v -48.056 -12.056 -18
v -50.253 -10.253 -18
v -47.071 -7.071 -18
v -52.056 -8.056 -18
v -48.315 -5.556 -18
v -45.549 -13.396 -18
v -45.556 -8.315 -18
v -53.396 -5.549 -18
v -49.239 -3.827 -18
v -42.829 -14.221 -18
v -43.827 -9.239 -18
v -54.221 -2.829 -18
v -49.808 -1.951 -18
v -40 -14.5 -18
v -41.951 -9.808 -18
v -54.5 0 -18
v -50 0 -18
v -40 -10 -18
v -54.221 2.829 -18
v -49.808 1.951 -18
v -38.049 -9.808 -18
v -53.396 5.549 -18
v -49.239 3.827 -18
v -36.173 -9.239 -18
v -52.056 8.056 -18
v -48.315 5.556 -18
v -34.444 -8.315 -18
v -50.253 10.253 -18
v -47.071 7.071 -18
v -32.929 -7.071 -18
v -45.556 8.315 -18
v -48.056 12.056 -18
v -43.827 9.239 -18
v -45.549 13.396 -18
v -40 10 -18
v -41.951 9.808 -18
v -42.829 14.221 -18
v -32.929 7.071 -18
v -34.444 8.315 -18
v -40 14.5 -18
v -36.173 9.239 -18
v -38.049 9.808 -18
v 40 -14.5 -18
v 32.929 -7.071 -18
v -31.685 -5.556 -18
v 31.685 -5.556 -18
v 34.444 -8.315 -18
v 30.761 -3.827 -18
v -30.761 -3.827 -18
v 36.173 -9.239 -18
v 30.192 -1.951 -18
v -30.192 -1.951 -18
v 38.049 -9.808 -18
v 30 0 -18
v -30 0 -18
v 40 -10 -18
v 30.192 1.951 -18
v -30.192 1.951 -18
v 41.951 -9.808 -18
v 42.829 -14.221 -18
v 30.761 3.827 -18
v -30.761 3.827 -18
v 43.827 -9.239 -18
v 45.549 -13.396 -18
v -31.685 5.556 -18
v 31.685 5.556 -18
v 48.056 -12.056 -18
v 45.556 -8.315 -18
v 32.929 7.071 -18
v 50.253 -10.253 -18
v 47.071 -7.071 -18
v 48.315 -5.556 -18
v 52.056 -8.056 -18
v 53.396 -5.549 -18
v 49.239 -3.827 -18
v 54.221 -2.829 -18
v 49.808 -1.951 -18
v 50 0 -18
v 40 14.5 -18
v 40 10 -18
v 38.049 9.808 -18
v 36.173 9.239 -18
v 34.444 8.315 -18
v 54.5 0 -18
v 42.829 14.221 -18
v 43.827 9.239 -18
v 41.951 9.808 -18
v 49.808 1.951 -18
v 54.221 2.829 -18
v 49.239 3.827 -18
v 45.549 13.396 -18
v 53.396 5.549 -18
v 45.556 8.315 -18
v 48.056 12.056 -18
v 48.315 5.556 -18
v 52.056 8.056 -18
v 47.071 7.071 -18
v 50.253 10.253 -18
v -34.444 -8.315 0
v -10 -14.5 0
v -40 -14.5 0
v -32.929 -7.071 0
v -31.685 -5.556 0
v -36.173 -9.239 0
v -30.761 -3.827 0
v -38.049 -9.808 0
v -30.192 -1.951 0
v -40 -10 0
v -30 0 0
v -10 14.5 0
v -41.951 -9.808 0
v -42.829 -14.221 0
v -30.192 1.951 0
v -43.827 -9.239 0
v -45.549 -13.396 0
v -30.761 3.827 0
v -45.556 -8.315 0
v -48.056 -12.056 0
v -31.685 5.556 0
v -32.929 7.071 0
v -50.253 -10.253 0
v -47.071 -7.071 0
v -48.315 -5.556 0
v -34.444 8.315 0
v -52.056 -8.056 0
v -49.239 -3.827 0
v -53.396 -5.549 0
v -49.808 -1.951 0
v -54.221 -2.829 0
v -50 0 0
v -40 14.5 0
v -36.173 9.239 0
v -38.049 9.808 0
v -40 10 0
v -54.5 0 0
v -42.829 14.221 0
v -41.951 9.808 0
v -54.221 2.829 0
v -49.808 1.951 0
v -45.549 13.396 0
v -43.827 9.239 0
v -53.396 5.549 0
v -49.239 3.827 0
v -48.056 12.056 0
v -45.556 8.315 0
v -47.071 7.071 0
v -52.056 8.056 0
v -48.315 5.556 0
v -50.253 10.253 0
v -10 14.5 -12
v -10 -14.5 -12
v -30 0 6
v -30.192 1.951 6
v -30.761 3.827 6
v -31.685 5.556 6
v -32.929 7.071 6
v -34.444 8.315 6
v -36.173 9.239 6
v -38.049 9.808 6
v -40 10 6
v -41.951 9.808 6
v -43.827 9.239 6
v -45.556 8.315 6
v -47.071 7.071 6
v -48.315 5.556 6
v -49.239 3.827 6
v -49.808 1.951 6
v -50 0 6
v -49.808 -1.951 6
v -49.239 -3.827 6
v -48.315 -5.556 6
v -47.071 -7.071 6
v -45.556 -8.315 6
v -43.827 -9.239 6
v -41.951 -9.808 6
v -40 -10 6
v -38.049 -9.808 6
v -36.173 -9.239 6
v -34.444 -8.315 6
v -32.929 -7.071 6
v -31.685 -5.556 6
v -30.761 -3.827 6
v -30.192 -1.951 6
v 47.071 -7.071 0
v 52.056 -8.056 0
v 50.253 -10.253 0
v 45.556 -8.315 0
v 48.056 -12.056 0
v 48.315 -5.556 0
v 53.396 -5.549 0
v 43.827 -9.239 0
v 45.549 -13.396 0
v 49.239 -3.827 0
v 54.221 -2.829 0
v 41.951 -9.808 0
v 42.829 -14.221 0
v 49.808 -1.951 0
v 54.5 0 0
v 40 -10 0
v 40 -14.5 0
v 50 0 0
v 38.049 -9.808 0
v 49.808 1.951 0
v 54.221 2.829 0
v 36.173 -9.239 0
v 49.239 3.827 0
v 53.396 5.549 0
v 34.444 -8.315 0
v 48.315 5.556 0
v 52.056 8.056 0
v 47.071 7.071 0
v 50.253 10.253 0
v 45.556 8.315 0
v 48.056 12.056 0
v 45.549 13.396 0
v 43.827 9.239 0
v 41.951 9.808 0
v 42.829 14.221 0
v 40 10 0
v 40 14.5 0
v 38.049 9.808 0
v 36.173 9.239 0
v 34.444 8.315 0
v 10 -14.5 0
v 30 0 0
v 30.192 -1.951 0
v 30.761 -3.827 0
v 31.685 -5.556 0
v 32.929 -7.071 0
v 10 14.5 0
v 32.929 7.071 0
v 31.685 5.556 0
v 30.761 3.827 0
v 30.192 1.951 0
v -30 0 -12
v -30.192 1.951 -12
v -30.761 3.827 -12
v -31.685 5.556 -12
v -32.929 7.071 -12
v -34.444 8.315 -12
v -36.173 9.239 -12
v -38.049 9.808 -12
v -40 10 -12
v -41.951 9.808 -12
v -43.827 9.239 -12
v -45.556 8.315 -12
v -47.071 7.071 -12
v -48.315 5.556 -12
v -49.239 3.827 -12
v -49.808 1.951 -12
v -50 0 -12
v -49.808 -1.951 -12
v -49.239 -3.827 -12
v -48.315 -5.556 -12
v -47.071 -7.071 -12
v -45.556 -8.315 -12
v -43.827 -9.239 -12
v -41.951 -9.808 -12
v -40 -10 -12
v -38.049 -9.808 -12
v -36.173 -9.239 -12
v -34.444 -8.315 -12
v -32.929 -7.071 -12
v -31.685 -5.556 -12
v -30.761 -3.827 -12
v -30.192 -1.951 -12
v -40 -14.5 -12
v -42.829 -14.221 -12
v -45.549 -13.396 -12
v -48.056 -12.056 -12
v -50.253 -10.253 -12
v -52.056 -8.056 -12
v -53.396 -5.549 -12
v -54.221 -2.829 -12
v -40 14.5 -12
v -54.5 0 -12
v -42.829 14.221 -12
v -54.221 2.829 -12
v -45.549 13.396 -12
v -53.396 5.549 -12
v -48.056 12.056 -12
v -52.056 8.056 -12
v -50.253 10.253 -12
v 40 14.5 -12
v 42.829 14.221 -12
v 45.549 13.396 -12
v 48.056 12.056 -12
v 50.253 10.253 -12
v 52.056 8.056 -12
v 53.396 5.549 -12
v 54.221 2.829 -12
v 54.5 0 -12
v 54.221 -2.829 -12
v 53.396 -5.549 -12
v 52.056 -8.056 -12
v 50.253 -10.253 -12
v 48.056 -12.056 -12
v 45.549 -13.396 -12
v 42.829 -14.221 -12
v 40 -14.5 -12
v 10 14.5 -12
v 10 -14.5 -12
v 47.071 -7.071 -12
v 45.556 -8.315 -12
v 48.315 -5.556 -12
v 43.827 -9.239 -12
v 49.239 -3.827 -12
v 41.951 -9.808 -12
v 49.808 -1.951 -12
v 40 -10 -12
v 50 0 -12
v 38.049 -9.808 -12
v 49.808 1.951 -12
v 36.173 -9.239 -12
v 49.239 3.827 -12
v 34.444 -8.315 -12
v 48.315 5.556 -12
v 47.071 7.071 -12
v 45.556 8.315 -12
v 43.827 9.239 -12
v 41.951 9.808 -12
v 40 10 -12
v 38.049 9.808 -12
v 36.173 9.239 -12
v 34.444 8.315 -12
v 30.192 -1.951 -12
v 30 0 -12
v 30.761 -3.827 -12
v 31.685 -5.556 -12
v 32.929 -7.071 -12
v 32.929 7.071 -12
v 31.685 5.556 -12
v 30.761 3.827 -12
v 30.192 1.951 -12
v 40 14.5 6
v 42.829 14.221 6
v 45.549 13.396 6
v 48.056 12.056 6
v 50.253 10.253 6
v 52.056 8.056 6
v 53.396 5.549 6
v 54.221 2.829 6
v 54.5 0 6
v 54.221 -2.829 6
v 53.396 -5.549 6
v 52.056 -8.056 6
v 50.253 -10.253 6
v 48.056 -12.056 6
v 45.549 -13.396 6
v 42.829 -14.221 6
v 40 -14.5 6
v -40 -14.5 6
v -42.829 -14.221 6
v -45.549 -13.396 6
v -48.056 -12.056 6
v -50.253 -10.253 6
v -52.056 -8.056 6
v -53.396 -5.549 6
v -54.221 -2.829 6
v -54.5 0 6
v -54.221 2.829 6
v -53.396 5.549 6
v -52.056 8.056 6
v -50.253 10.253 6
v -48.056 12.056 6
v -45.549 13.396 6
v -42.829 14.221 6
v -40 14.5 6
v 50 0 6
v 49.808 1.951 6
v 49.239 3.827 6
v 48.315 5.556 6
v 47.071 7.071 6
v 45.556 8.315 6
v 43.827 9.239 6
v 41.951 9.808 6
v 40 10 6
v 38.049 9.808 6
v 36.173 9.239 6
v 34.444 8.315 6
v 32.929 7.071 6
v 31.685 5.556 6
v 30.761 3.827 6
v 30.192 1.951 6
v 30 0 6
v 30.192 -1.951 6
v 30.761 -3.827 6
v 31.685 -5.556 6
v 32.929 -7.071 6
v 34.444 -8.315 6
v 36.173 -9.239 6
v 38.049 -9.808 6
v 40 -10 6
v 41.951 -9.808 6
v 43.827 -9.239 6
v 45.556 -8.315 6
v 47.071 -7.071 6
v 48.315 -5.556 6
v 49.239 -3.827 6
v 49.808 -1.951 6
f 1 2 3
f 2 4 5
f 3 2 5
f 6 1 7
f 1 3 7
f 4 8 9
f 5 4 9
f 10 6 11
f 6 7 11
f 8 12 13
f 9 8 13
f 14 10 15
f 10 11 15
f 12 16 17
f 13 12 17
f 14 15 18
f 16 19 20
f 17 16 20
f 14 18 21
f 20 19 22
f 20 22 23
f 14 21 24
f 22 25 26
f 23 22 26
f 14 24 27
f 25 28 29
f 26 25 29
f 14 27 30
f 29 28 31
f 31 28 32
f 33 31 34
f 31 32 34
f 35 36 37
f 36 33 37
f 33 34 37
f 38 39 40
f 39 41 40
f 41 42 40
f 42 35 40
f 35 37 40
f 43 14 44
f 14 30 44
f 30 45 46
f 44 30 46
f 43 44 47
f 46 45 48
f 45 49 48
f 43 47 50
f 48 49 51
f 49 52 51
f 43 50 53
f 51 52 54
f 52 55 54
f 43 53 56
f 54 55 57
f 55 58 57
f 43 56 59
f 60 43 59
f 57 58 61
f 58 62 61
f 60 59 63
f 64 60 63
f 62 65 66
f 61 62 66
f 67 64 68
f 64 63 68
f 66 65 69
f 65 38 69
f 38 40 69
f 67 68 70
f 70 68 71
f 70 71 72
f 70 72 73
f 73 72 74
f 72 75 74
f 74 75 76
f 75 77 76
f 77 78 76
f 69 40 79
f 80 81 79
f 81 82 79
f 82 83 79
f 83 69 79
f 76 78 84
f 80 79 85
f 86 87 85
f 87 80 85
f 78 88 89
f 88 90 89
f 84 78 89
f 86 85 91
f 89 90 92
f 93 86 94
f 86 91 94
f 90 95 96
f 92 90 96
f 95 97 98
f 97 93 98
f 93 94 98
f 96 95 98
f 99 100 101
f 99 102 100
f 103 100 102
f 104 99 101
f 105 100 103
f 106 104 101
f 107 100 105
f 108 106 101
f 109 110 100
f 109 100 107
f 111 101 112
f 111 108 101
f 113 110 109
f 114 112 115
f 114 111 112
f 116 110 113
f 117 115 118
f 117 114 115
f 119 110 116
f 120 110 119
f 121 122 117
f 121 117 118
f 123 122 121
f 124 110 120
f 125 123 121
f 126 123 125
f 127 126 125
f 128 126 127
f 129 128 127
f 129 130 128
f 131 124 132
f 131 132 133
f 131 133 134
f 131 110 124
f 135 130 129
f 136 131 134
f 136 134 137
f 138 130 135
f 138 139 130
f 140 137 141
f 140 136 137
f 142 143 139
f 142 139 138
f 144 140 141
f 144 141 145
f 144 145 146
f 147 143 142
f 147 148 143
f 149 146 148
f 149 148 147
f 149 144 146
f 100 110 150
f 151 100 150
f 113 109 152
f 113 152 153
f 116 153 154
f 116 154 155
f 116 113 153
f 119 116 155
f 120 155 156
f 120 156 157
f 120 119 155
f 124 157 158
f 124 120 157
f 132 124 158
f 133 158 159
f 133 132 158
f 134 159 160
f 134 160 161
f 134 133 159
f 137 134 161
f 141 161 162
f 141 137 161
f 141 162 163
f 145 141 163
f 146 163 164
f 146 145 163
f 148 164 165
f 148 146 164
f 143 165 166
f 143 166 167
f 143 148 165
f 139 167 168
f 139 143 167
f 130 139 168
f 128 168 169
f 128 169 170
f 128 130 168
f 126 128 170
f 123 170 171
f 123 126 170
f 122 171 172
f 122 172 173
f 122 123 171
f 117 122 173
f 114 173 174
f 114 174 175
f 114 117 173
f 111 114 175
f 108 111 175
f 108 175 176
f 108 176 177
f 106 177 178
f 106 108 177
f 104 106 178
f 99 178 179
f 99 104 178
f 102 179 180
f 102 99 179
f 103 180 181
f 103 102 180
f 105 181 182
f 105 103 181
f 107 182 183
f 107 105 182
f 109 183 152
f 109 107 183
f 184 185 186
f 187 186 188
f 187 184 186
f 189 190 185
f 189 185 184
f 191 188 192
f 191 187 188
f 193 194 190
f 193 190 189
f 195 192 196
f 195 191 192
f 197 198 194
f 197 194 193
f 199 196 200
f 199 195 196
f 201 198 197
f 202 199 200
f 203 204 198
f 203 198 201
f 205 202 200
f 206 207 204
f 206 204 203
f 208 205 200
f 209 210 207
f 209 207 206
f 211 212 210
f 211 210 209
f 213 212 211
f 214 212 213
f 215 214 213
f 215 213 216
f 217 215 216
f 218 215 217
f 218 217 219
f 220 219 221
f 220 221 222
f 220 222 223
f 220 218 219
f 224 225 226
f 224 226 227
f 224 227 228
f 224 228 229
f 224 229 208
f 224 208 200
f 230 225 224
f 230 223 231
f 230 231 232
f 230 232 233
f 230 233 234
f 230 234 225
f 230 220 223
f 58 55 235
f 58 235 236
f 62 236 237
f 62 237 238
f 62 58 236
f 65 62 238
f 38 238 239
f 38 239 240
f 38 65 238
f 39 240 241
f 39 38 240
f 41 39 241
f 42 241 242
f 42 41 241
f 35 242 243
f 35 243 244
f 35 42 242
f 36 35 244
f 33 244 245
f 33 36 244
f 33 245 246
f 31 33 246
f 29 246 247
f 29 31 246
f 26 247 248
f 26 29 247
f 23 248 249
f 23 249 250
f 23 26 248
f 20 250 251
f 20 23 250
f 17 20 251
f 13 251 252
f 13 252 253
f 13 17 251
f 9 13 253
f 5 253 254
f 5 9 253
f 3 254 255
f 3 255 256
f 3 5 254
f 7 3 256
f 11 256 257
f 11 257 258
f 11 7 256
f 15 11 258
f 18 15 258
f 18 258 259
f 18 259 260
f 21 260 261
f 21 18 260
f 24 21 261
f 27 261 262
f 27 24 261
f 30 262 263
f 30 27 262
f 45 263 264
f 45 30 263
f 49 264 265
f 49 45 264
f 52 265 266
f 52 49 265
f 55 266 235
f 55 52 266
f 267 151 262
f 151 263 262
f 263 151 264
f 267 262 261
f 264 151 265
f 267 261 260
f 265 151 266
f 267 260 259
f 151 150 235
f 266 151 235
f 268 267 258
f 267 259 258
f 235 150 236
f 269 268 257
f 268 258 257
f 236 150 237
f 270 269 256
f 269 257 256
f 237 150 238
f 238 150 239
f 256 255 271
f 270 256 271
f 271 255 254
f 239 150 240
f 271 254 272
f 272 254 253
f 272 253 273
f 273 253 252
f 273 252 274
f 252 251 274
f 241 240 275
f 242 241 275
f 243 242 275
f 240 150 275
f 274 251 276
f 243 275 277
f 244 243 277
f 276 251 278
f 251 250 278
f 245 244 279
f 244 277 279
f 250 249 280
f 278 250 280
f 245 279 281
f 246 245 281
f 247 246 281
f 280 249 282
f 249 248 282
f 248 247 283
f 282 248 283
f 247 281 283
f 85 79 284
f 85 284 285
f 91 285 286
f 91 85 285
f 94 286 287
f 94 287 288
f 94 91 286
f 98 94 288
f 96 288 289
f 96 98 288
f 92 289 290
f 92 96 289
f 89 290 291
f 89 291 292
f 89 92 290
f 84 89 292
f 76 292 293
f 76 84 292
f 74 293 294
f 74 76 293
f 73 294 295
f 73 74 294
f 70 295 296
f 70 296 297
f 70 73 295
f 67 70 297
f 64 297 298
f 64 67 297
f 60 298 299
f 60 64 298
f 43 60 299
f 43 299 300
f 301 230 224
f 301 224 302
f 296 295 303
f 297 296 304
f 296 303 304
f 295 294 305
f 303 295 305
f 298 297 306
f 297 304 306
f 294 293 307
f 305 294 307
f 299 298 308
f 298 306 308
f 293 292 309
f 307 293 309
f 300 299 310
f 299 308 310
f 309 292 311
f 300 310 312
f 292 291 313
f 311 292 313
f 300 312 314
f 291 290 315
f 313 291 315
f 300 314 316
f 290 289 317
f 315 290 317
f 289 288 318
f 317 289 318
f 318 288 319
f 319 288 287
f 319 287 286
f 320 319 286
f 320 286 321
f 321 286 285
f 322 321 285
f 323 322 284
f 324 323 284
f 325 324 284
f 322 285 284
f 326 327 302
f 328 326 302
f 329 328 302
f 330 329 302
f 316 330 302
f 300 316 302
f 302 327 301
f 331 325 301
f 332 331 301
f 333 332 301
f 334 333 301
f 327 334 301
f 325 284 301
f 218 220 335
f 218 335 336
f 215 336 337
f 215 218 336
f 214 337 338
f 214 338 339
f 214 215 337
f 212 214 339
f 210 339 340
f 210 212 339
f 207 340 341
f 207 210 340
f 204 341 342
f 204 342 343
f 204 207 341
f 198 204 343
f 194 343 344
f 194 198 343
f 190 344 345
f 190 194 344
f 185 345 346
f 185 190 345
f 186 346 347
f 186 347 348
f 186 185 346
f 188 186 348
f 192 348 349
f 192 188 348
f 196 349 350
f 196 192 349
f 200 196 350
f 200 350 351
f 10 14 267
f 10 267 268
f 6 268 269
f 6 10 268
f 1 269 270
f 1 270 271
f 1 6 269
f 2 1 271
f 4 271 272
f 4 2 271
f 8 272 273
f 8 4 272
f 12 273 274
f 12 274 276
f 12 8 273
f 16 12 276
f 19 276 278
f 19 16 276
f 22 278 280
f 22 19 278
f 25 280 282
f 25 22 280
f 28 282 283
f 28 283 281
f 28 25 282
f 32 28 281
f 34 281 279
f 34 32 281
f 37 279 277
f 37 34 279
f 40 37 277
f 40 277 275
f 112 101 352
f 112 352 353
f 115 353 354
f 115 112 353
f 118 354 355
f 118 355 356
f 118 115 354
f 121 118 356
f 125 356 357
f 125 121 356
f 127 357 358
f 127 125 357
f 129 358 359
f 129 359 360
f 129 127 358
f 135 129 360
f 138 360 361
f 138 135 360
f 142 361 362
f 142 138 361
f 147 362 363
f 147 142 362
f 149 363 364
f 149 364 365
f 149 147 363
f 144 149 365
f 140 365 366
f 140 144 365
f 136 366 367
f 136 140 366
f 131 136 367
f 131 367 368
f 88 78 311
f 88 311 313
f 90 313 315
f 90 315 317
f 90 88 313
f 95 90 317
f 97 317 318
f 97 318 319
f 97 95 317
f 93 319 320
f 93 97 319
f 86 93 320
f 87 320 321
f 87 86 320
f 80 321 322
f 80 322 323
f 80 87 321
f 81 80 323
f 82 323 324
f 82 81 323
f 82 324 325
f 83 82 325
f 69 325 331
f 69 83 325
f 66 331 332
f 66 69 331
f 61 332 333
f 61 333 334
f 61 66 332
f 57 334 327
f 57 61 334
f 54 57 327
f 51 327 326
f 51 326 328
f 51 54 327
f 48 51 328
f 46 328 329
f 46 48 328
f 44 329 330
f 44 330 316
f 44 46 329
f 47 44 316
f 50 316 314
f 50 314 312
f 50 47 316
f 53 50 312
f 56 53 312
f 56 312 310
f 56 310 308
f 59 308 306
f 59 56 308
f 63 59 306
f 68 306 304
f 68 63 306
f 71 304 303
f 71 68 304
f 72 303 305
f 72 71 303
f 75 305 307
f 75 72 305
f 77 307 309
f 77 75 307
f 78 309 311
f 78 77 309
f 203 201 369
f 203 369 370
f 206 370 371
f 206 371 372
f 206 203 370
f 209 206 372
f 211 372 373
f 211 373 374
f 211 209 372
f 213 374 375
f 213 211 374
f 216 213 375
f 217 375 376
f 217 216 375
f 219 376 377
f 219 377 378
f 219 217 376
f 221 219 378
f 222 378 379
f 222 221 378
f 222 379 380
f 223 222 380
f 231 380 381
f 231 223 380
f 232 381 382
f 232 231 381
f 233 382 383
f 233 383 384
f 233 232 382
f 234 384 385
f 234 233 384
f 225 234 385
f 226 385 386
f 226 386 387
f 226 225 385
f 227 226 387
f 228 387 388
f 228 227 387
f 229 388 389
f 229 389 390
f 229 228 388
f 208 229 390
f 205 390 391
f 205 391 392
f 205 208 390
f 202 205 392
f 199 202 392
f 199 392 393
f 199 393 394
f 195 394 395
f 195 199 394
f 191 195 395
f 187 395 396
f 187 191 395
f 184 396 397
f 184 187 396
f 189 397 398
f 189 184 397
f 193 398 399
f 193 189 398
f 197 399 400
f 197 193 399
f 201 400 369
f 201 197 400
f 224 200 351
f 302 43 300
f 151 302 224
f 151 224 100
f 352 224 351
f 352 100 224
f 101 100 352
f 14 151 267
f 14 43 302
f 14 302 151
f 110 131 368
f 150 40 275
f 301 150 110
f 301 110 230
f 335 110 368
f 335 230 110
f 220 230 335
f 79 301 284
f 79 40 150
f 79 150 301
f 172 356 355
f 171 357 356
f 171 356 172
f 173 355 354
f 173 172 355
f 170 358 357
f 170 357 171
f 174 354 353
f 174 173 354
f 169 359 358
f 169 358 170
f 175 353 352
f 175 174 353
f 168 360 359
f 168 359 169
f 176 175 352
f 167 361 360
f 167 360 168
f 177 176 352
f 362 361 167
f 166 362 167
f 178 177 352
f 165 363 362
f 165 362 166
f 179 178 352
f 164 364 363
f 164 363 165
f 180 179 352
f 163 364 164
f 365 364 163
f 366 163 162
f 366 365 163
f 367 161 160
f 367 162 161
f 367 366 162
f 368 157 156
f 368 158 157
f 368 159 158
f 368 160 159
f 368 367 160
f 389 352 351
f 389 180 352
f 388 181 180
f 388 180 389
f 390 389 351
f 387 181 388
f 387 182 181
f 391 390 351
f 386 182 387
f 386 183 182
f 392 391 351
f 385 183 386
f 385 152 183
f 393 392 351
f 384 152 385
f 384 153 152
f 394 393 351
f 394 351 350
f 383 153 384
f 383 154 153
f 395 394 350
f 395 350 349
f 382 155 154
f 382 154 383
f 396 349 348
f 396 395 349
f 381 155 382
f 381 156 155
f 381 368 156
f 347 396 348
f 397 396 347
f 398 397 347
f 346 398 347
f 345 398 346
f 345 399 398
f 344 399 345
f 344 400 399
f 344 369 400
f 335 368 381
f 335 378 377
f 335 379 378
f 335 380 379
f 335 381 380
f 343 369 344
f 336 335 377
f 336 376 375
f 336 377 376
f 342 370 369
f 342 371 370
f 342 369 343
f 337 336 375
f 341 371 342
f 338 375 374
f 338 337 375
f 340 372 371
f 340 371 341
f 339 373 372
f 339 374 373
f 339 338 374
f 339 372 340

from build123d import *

# Parameters (mm, degrees)
SKETCH1_R           = 10
BOSS_EXTRUDE1_DEPTH = 6
BOSS_EXTRUDE2_START = -18
SKETCH1_2_R         = 10
BOSS_EXTRUDE2_DEPTH = 6
SKETCH4_W           = 20
SKETCH4_H           = 24
BOSS_EXTRUDE3_DEPTH = 29


with BuildPart() as part:
    # Sketch1 → Boss-Extrude1 (new body)
    with BuildSketch(Plane.XY):
        with BuildLine():
            Line((40, -14.5), (-40, -14.5))
            ThreePointArc((-40, -14.5), (-54.5, 0), (-40, 14.5))
            Line((-40, 14.5), (40, 14.5))
            ThreePointArc((40, 14.5), (54.5, 0), (40, -14.5))
        make_face()
        with Locations((-40, 0)):
            Circle(SKETCH1_R, mode=Mode.SUBTRACT)
        with Locations((40, 0)):
            Circle(SKETCH1_R, mode=Mode.SUBTRACT)
    extrude(amount=BOSS_EXTRUDE1_DEPTH)



with BuildPart() as body_2:
    # Sketch1_2 → Boss-Extrude2 (new body)
    with BuildSketch(Plane.XY.offset(BOSS_EXTRUDE2_START)):
        with BuildLine():
            Line((40, -14.5), (-40, -14.5))
            ThreePointArc((-40, -14.5), (-54.5, 0), (-40, 14.5))
            Line((-40, 14.5), (40, 14.5))
            ThreePointArc((40, 14.5), (54.5, 0), (40, -14.5))
        make_face()
        with Locations((-40, 0)):
            Circle(SKETCH1_2_R, mode=Mode.SUBTRACT)
        with Locations((40, 0)):
            Circle(SKETCH1_2_R, mode=Mode.SUBTRACT)
    extrude(amount=BOSS_EXTRUDE2_DEPTH)


with BuildPart() as part_1:
    add(part.part)

    add(body_2.part)  # Boss-Extrude3 merges body 2
    # Sketch4 → Boss-Extrude3 (add)
    with BuildSketch(Plane(origin=(0, 14.5, 0), x_dir=(1, 0, 0), z_dir=(0, 1, 0))):
        with Locations((0, 6)):
            Rectangle(SKETCH4_W, SKETCH4_H)
    extrude(amount=-BOSS_EXTRUDE3_DEPTH)


solid = part_1.part
